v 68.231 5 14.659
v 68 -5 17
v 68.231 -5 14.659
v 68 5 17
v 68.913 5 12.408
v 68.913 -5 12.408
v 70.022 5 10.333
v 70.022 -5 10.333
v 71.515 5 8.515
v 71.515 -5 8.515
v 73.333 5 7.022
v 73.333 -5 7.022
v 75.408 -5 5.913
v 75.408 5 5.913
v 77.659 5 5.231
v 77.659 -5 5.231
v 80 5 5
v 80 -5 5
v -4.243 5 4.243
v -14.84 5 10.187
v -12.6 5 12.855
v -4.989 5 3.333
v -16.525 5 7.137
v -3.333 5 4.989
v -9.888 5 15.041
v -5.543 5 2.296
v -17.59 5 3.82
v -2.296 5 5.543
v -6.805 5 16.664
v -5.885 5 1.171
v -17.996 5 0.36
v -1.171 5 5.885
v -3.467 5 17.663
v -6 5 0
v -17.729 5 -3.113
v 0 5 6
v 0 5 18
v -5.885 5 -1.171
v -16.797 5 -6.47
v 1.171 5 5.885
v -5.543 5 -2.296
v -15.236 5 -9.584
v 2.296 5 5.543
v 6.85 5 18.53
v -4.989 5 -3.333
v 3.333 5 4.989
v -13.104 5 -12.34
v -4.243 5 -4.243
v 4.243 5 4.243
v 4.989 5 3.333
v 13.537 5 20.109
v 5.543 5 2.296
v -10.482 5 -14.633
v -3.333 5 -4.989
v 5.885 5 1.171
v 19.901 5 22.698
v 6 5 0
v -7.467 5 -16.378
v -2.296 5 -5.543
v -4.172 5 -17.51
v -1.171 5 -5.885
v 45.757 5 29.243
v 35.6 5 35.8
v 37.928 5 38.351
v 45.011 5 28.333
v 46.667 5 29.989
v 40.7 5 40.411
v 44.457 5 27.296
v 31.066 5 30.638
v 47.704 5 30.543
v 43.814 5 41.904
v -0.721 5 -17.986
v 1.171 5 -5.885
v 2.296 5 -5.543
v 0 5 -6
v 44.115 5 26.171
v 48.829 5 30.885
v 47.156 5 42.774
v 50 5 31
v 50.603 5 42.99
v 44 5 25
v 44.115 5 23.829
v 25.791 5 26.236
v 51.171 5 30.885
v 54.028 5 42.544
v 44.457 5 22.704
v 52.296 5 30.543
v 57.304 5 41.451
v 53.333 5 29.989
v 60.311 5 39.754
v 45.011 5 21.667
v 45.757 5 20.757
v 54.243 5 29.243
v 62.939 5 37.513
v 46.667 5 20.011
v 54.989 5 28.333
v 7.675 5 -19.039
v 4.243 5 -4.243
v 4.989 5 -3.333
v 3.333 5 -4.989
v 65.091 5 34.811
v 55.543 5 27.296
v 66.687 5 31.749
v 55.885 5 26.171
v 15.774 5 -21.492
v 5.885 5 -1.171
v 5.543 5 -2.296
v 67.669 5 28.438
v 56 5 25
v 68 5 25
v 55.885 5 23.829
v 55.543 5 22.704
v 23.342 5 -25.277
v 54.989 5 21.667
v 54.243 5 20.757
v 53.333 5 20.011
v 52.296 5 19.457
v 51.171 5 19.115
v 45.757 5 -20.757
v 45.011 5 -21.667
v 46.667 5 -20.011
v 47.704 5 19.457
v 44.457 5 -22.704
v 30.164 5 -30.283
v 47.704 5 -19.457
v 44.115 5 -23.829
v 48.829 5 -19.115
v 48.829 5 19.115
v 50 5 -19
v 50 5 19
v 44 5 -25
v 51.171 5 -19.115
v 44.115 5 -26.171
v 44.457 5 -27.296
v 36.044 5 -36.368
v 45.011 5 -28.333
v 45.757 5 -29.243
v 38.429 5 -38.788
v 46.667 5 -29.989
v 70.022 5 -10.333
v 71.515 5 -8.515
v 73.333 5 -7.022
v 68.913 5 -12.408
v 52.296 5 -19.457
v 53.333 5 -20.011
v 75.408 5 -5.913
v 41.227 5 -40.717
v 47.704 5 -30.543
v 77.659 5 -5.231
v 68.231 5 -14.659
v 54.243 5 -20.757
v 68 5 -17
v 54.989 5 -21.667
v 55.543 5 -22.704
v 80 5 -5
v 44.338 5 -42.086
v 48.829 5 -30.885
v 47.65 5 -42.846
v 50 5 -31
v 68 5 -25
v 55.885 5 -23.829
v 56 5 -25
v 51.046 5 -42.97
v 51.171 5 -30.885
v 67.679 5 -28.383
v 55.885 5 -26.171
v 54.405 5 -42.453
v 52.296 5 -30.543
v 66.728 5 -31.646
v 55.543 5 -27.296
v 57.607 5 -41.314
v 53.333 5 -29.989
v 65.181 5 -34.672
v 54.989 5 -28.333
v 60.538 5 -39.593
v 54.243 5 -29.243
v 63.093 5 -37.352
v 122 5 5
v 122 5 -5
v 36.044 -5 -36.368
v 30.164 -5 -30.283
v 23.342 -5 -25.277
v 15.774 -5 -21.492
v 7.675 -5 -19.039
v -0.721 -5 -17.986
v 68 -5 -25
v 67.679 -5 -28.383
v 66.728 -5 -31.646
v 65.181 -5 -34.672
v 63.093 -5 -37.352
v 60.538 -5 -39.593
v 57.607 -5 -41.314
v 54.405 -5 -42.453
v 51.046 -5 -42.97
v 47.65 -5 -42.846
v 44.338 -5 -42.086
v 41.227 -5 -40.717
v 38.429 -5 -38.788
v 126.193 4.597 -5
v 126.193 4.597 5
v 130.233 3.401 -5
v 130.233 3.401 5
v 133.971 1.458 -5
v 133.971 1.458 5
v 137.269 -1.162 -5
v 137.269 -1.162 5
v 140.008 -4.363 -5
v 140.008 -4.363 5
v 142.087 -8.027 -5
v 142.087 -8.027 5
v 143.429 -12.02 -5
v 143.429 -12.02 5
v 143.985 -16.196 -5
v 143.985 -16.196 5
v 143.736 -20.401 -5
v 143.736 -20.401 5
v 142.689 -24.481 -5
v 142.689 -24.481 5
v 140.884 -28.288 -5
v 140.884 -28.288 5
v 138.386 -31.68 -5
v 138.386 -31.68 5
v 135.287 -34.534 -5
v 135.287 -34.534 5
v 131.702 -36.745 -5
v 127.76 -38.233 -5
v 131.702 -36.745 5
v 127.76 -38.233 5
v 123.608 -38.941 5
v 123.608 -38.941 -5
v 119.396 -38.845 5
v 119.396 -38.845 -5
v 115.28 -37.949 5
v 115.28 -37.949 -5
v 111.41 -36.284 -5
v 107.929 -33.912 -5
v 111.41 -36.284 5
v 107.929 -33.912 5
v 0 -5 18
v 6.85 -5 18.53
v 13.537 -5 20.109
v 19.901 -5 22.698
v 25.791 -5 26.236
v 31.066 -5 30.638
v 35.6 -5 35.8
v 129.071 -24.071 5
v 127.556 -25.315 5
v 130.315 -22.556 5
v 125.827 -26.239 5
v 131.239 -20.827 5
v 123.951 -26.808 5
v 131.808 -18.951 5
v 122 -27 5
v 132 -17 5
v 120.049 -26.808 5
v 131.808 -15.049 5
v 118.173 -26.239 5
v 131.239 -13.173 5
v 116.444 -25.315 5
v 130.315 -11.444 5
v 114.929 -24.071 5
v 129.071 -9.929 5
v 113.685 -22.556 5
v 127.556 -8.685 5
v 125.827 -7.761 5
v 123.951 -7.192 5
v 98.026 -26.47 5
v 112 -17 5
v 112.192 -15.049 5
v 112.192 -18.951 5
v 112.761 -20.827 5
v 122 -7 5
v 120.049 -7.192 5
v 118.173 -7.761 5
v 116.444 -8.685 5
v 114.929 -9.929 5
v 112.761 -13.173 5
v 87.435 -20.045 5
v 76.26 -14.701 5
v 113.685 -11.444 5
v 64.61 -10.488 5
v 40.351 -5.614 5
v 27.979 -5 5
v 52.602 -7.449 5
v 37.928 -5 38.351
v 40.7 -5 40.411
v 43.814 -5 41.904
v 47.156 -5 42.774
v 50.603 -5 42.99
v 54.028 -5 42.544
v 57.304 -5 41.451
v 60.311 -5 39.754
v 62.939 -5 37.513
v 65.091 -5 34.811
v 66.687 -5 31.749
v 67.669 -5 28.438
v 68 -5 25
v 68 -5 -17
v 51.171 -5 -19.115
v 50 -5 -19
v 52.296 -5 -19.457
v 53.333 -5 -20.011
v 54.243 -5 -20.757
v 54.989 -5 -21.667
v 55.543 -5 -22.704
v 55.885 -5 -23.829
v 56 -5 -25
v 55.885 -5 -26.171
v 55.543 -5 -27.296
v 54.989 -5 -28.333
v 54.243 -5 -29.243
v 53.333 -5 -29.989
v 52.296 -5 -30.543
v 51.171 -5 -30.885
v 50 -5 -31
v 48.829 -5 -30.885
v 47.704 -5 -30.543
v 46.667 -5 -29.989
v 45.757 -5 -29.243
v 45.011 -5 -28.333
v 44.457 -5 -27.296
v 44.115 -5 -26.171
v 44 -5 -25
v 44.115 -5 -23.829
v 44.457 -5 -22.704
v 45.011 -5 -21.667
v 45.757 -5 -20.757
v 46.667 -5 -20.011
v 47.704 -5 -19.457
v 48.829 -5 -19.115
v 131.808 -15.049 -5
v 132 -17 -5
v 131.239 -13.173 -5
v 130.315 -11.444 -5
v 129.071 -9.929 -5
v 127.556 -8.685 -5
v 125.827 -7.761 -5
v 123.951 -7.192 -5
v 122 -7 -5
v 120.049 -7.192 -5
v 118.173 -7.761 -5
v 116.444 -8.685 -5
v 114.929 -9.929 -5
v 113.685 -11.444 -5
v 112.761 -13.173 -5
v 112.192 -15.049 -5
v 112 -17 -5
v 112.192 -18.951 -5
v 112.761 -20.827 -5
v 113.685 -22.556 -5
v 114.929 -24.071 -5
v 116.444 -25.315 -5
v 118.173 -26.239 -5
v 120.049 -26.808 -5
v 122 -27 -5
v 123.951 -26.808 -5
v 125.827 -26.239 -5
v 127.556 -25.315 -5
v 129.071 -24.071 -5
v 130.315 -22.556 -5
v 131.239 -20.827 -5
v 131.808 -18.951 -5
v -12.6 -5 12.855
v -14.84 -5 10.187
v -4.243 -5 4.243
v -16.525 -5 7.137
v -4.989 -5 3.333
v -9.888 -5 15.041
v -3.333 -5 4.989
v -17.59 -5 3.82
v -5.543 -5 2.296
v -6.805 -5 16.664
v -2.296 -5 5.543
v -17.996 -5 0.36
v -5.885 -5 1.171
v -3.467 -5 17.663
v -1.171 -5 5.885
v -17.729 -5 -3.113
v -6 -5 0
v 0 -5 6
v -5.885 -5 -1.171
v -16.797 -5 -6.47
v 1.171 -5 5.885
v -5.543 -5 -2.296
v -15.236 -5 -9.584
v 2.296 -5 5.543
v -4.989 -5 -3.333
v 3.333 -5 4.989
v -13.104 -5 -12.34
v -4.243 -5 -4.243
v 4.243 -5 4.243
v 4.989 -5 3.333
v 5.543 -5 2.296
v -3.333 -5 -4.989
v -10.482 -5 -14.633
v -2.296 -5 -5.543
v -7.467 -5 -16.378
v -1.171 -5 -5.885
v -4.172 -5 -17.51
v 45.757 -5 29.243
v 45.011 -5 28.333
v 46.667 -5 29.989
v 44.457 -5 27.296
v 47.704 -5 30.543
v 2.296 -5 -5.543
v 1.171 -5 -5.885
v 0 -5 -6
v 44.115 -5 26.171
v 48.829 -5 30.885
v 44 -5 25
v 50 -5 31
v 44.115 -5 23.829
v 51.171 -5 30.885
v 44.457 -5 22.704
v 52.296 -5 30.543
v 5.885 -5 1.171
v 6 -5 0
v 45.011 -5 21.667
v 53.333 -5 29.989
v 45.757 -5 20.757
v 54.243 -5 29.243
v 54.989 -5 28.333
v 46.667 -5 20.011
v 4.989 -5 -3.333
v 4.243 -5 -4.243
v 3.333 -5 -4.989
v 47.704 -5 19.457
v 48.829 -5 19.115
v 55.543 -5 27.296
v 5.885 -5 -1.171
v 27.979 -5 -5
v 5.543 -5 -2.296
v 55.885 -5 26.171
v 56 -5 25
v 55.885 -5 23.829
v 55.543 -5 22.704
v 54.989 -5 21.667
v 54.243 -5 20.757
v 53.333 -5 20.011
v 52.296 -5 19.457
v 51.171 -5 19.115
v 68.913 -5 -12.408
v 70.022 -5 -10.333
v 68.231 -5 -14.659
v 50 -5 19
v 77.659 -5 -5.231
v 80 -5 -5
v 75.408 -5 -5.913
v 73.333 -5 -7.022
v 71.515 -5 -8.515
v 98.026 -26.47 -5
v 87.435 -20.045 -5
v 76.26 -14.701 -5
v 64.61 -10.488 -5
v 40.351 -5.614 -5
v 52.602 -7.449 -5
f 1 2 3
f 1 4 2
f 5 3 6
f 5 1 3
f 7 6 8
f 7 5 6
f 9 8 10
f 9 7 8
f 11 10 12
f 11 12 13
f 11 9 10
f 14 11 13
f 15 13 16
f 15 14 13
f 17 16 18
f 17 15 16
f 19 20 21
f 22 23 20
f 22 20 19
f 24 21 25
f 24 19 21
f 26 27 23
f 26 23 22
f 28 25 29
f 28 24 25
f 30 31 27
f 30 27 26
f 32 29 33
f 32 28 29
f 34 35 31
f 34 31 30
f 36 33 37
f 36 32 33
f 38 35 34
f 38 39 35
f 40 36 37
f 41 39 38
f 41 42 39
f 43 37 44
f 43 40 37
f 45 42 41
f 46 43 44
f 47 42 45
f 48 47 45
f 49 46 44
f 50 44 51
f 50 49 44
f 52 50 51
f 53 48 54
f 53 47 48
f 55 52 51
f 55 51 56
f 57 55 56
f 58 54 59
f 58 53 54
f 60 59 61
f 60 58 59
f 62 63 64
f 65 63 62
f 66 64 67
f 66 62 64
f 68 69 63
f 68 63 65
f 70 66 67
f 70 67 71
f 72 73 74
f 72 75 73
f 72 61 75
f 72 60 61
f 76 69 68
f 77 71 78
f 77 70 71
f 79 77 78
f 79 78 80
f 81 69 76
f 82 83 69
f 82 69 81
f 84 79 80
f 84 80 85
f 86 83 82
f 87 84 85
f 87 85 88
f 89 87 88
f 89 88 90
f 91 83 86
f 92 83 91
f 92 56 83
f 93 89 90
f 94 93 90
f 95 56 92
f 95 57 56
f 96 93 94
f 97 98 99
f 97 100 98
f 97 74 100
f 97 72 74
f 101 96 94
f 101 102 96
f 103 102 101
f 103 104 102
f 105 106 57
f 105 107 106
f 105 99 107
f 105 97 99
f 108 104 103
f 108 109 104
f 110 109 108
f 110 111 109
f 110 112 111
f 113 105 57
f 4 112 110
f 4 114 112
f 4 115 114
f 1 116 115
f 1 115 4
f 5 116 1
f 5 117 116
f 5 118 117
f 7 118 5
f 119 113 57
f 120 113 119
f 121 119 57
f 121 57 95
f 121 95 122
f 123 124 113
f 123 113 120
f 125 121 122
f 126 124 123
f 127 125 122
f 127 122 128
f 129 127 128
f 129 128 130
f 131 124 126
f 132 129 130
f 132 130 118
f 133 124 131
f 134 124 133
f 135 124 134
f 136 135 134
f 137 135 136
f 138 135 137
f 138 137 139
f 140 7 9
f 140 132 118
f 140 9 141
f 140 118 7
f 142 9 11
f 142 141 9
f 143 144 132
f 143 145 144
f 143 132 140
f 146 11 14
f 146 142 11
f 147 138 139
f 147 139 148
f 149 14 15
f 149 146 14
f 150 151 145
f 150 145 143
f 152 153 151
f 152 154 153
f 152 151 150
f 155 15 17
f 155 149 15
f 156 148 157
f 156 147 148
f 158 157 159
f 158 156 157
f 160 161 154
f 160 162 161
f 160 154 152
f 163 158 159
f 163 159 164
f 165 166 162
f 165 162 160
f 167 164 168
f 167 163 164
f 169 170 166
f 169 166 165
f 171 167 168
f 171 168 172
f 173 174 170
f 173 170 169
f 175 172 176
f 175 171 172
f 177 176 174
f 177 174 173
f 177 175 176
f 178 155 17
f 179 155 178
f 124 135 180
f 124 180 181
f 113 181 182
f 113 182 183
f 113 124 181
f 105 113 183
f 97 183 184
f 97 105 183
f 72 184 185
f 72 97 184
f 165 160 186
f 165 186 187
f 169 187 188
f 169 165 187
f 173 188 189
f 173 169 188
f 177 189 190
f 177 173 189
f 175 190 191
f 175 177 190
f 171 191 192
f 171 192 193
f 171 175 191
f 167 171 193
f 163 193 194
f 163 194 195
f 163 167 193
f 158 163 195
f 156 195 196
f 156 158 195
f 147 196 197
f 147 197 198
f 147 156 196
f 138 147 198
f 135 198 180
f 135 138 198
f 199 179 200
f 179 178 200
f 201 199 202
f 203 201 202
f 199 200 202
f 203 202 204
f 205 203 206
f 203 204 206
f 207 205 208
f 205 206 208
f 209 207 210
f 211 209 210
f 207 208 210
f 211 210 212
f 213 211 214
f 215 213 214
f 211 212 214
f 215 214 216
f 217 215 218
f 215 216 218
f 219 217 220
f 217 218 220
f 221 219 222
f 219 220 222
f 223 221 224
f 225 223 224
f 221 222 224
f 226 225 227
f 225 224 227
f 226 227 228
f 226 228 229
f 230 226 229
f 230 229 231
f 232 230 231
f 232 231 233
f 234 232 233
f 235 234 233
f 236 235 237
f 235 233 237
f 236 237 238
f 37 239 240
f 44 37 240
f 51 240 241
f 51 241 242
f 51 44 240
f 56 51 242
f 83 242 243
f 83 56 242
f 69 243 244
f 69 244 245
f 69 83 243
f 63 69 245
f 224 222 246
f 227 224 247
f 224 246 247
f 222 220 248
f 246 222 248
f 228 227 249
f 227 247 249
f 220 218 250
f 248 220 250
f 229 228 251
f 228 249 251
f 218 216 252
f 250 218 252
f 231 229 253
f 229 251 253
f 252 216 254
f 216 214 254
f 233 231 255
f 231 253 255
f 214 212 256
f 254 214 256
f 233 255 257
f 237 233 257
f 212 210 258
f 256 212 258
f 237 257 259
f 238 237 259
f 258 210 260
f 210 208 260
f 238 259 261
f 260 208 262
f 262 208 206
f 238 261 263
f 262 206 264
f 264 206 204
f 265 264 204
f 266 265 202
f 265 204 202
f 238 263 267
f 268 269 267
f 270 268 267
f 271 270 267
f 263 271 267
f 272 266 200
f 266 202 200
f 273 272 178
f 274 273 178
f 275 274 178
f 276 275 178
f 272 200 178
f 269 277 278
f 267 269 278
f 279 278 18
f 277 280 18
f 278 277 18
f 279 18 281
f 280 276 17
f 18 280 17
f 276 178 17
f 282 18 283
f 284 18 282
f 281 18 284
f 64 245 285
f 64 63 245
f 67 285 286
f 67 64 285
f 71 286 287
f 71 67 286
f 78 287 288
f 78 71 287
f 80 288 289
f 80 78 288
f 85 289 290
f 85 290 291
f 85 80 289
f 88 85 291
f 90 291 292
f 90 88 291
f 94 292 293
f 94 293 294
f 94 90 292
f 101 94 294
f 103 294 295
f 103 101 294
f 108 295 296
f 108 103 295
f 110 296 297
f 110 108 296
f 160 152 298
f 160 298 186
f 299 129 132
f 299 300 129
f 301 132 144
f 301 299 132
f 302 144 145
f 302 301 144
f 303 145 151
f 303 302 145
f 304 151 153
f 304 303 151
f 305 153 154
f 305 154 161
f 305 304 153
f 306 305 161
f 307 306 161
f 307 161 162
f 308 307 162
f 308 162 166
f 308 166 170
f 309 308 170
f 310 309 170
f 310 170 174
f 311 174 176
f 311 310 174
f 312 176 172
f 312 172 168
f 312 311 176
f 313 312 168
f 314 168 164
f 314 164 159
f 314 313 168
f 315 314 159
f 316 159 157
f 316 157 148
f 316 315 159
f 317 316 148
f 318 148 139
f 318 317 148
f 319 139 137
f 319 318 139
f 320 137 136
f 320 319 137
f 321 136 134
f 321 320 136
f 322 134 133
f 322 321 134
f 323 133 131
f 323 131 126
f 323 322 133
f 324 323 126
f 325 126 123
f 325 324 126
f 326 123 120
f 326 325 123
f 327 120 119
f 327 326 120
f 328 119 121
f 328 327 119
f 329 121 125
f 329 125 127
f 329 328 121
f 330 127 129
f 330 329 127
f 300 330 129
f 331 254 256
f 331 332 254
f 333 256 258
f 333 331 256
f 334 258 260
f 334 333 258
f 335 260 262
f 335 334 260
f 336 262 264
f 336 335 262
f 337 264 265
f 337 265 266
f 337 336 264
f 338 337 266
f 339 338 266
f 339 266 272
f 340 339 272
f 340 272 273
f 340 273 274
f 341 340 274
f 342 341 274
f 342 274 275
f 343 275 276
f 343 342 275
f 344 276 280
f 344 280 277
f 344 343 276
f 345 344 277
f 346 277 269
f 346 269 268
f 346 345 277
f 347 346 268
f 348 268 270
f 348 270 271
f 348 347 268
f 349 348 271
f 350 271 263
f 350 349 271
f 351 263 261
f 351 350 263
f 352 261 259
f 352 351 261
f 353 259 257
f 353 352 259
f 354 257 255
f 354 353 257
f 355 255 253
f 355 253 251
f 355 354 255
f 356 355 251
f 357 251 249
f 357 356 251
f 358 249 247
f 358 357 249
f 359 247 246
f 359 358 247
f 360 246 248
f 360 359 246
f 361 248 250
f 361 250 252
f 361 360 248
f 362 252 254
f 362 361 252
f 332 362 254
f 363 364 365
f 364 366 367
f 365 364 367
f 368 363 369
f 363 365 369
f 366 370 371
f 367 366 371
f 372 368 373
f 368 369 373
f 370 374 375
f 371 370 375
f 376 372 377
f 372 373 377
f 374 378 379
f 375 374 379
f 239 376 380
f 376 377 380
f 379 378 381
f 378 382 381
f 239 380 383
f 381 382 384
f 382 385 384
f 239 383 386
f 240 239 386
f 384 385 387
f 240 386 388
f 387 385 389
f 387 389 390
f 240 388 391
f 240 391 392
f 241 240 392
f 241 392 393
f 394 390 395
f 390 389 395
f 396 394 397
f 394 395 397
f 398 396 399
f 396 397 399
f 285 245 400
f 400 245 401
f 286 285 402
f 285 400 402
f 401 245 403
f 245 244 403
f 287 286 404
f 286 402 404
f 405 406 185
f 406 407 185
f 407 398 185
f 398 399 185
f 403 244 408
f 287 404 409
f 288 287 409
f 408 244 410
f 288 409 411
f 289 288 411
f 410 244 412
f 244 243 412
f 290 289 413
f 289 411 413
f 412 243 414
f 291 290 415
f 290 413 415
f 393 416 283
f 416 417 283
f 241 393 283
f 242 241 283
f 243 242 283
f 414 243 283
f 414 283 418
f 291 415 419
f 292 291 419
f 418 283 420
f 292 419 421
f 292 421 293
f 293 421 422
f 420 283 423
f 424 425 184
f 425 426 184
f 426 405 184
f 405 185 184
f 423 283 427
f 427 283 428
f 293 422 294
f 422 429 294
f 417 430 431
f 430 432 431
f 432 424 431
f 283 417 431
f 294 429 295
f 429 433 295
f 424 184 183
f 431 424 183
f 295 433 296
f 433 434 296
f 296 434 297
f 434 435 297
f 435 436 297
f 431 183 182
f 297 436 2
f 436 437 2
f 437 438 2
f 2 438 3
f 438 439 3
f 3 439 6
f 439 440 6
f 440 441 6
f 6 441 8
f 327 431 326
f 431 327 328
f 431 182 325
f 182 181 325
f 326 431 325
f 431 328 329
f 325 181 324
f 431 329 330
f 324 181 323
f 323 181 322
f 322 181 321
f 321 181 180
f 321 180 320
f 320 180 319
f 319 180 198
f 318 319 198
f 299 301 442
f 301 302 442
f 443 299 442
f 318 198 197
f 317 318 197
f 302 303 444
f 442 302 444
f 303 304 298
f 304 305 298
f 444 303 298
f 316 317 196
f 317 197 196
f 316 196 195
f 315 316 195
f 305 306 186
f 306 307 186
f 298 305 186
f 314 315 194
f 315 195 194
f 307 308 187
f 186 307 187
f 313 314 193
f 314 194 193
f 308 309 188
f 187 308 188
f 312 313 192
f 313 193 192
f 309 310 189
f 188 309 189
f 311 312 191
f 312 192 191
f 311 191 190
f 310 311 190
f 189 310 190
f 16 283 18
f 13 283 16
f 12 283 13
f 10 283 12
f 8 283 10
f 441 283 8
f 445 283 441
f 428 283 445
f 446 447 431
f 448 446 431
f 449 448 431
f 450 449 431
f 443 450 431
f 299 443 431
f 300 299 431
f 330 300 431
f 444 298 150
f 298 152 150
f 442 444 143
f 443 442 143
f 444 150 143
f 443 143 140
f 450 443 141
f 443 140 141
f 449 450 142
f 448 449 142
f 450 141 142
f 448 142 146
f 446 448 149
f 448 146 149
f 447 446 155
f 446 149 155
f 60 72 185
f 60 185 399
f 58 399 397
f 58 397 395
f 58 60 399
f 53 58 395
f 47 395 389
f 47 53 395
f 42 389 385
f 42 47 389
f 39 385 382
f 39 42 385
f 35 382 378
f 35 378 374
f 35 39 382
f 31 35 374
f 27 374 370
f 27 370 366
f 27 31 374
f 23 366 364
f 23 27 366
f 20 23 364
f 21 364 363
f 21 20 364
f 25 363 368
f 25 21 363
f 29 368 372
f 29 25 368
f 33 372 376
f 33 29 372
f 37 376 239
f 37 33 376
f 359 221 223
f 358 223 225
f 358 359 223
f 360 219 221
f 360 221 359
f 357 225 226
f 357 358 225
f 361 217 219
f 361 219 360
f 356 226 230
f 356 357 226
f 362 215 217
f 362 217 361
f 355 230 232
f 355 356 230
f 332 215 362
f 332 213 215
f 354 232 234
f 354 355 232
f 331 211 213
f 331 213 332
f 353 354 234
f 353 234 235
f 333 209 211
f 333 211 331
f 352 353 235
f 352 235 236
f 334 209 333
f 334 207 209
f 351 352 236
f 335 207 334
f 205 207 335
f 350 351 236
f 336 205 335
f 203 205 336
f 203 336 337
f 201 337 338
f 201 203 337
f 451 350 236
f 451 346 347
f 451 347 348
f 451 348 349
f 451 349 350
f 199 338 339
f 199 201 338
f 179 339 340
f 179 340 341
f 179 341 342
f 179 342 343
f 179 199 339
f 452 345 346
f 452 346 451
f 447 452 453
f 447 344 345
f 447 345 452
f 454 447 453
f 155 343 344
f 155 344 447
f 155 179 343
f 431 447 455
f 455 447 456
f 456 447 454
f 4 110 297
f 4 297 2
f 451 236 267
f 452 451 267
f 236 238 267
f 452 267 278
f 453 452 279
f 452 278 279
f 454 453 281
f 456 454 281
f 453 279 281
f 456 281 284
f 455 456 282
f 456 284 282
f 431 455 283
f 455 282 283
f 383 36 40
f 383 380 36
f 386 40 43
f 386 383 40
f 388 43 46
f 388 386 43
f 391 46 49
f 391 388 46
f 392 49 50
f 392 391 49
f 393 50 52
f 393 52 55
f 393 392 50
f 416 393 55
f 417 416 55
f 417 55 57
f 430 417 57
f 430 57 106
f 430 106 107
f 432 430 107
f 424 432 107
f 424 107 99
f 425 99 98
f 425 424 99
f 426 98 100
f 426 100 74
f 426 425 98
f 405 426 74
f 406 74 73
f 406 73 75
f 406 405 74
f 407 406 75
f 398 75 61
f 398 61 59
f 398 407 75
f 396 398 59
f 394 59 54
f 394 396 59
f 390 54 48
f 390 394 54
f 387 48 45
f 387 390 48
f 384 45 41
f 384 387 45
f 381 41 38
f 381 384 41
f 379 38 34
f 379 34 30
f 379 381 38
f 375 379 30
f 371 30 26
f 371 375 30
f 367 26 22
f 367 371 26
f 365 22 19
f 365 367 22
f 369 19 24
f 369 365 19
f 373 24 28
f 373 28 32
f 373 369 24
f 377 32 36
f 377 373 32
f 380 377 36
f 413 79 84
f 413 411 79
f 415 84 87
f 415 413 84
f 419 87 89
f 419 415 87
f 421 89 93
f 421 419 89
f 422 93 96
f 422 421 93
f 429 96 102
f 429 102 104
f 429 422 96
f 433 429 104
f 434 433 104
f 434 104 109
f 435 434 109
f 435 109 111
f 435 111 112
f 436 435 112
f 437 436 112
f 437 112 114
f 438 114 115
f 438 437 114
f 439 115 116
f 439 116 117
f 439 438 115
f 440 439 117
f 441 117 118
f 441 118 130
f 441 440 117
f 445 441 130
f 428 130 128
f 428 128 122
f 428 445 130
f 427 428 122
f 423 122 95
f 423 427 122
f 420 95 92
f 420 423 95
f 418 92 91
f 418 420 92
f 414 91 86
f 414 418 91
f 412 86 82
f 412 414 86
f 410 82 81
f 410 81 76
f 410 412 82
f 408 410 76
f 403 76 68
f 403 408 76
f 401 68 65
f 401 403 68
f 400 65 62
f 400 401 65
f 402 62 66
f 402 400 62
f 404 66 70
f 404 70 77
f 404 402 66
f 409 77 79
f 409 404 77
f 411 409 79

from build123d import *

# Parameters (mm, degrees)
SKETCH2_R           = 6
BOSS_EXTRUDE1_DEPTH = 5
SKETCH3_R           = 10
BOSS_EXTRUDE2_DEPTH = 5
FILLET1_R           = 12


with BuildPart() as part:
    # Sketch2 → Boss-Extrude1 (new, symmetric)
    with BuildSketch(Plane(origin=(0, 0, 0), x_dir=(1, 0, 0), z_dir=(0, 1, 0))):
        with BuildLine():
            Line((68, -25), (68, 25))
            ThreePointArc((68, 25), (56.032896381, 41.958896227), (36.043982083, 36.367918187))
            ThreePointArc((36.043982083, 36.367918187), (19.637945422, 23.224109156), (-0.720723799, 17.985565246))
            ThreePointArc((-0.720723799, 17.985565246), (-17.99639095, -0.360434168), (0, -18))
            ThreePointArc((0, -18), (19.901005, -22.697990001), (35.6, -35.8))
            ThreePointArc((35.6, -35.8), (55.692099788, -42.076299365), (68, -25))
        make_face()
        with Locations(Location((0, 0, 0), (0, 0, 270))):
            Circle(SKETCH2_R, mode=Mode.SUBTRACT)
        with Locations(Location((50, -25, 0), (0, 0, 270))):
            Circle(SKETCH2_R, mode=Mode.SUBTRACT)
        with Locations(Location((50, 25, 0), (0, 0, 270))):
            Circle(SKETCH2_R, mode=Mode.SUBTRACT)
    extrude(amount=BOSS_EXTRUDE1_DEPTH, both=True)

    # Sketch3 → Boss-Extrude2 (add, symmetric)
    with BuildSketch(Plane.XY):
        with BuildLine():
            Line((12, 5), (122, 5))
            ThreePointArc((122, 5), (142.688818499, -24.481496449), (107.928788897, -33.911564626))
            ThreePointArc((107.928788897, -33.911564626), (70.487228363, -12.449894892), (27.978725812, -5))
            Line((27.978725812, -5), (12, -5))
            Line((12, -5), (12, 5))
        make_face()
        with Locations((122, -17)):
            Circle(SKETCH3_R, mode=Mode.SUBTRACT)
    extrude(amount=BOSS_EXTRUDE2_DEPTH, both=True)

    # Fillet1
    fillet1_edges = [part.edges().sort_by_distance(p)[0] for p in [
        (68, 0, 5),
        (68, 0, -5),
    ]]
    fillet(fillet1_edges, radius=FILLET1_R)


solid = part.part
